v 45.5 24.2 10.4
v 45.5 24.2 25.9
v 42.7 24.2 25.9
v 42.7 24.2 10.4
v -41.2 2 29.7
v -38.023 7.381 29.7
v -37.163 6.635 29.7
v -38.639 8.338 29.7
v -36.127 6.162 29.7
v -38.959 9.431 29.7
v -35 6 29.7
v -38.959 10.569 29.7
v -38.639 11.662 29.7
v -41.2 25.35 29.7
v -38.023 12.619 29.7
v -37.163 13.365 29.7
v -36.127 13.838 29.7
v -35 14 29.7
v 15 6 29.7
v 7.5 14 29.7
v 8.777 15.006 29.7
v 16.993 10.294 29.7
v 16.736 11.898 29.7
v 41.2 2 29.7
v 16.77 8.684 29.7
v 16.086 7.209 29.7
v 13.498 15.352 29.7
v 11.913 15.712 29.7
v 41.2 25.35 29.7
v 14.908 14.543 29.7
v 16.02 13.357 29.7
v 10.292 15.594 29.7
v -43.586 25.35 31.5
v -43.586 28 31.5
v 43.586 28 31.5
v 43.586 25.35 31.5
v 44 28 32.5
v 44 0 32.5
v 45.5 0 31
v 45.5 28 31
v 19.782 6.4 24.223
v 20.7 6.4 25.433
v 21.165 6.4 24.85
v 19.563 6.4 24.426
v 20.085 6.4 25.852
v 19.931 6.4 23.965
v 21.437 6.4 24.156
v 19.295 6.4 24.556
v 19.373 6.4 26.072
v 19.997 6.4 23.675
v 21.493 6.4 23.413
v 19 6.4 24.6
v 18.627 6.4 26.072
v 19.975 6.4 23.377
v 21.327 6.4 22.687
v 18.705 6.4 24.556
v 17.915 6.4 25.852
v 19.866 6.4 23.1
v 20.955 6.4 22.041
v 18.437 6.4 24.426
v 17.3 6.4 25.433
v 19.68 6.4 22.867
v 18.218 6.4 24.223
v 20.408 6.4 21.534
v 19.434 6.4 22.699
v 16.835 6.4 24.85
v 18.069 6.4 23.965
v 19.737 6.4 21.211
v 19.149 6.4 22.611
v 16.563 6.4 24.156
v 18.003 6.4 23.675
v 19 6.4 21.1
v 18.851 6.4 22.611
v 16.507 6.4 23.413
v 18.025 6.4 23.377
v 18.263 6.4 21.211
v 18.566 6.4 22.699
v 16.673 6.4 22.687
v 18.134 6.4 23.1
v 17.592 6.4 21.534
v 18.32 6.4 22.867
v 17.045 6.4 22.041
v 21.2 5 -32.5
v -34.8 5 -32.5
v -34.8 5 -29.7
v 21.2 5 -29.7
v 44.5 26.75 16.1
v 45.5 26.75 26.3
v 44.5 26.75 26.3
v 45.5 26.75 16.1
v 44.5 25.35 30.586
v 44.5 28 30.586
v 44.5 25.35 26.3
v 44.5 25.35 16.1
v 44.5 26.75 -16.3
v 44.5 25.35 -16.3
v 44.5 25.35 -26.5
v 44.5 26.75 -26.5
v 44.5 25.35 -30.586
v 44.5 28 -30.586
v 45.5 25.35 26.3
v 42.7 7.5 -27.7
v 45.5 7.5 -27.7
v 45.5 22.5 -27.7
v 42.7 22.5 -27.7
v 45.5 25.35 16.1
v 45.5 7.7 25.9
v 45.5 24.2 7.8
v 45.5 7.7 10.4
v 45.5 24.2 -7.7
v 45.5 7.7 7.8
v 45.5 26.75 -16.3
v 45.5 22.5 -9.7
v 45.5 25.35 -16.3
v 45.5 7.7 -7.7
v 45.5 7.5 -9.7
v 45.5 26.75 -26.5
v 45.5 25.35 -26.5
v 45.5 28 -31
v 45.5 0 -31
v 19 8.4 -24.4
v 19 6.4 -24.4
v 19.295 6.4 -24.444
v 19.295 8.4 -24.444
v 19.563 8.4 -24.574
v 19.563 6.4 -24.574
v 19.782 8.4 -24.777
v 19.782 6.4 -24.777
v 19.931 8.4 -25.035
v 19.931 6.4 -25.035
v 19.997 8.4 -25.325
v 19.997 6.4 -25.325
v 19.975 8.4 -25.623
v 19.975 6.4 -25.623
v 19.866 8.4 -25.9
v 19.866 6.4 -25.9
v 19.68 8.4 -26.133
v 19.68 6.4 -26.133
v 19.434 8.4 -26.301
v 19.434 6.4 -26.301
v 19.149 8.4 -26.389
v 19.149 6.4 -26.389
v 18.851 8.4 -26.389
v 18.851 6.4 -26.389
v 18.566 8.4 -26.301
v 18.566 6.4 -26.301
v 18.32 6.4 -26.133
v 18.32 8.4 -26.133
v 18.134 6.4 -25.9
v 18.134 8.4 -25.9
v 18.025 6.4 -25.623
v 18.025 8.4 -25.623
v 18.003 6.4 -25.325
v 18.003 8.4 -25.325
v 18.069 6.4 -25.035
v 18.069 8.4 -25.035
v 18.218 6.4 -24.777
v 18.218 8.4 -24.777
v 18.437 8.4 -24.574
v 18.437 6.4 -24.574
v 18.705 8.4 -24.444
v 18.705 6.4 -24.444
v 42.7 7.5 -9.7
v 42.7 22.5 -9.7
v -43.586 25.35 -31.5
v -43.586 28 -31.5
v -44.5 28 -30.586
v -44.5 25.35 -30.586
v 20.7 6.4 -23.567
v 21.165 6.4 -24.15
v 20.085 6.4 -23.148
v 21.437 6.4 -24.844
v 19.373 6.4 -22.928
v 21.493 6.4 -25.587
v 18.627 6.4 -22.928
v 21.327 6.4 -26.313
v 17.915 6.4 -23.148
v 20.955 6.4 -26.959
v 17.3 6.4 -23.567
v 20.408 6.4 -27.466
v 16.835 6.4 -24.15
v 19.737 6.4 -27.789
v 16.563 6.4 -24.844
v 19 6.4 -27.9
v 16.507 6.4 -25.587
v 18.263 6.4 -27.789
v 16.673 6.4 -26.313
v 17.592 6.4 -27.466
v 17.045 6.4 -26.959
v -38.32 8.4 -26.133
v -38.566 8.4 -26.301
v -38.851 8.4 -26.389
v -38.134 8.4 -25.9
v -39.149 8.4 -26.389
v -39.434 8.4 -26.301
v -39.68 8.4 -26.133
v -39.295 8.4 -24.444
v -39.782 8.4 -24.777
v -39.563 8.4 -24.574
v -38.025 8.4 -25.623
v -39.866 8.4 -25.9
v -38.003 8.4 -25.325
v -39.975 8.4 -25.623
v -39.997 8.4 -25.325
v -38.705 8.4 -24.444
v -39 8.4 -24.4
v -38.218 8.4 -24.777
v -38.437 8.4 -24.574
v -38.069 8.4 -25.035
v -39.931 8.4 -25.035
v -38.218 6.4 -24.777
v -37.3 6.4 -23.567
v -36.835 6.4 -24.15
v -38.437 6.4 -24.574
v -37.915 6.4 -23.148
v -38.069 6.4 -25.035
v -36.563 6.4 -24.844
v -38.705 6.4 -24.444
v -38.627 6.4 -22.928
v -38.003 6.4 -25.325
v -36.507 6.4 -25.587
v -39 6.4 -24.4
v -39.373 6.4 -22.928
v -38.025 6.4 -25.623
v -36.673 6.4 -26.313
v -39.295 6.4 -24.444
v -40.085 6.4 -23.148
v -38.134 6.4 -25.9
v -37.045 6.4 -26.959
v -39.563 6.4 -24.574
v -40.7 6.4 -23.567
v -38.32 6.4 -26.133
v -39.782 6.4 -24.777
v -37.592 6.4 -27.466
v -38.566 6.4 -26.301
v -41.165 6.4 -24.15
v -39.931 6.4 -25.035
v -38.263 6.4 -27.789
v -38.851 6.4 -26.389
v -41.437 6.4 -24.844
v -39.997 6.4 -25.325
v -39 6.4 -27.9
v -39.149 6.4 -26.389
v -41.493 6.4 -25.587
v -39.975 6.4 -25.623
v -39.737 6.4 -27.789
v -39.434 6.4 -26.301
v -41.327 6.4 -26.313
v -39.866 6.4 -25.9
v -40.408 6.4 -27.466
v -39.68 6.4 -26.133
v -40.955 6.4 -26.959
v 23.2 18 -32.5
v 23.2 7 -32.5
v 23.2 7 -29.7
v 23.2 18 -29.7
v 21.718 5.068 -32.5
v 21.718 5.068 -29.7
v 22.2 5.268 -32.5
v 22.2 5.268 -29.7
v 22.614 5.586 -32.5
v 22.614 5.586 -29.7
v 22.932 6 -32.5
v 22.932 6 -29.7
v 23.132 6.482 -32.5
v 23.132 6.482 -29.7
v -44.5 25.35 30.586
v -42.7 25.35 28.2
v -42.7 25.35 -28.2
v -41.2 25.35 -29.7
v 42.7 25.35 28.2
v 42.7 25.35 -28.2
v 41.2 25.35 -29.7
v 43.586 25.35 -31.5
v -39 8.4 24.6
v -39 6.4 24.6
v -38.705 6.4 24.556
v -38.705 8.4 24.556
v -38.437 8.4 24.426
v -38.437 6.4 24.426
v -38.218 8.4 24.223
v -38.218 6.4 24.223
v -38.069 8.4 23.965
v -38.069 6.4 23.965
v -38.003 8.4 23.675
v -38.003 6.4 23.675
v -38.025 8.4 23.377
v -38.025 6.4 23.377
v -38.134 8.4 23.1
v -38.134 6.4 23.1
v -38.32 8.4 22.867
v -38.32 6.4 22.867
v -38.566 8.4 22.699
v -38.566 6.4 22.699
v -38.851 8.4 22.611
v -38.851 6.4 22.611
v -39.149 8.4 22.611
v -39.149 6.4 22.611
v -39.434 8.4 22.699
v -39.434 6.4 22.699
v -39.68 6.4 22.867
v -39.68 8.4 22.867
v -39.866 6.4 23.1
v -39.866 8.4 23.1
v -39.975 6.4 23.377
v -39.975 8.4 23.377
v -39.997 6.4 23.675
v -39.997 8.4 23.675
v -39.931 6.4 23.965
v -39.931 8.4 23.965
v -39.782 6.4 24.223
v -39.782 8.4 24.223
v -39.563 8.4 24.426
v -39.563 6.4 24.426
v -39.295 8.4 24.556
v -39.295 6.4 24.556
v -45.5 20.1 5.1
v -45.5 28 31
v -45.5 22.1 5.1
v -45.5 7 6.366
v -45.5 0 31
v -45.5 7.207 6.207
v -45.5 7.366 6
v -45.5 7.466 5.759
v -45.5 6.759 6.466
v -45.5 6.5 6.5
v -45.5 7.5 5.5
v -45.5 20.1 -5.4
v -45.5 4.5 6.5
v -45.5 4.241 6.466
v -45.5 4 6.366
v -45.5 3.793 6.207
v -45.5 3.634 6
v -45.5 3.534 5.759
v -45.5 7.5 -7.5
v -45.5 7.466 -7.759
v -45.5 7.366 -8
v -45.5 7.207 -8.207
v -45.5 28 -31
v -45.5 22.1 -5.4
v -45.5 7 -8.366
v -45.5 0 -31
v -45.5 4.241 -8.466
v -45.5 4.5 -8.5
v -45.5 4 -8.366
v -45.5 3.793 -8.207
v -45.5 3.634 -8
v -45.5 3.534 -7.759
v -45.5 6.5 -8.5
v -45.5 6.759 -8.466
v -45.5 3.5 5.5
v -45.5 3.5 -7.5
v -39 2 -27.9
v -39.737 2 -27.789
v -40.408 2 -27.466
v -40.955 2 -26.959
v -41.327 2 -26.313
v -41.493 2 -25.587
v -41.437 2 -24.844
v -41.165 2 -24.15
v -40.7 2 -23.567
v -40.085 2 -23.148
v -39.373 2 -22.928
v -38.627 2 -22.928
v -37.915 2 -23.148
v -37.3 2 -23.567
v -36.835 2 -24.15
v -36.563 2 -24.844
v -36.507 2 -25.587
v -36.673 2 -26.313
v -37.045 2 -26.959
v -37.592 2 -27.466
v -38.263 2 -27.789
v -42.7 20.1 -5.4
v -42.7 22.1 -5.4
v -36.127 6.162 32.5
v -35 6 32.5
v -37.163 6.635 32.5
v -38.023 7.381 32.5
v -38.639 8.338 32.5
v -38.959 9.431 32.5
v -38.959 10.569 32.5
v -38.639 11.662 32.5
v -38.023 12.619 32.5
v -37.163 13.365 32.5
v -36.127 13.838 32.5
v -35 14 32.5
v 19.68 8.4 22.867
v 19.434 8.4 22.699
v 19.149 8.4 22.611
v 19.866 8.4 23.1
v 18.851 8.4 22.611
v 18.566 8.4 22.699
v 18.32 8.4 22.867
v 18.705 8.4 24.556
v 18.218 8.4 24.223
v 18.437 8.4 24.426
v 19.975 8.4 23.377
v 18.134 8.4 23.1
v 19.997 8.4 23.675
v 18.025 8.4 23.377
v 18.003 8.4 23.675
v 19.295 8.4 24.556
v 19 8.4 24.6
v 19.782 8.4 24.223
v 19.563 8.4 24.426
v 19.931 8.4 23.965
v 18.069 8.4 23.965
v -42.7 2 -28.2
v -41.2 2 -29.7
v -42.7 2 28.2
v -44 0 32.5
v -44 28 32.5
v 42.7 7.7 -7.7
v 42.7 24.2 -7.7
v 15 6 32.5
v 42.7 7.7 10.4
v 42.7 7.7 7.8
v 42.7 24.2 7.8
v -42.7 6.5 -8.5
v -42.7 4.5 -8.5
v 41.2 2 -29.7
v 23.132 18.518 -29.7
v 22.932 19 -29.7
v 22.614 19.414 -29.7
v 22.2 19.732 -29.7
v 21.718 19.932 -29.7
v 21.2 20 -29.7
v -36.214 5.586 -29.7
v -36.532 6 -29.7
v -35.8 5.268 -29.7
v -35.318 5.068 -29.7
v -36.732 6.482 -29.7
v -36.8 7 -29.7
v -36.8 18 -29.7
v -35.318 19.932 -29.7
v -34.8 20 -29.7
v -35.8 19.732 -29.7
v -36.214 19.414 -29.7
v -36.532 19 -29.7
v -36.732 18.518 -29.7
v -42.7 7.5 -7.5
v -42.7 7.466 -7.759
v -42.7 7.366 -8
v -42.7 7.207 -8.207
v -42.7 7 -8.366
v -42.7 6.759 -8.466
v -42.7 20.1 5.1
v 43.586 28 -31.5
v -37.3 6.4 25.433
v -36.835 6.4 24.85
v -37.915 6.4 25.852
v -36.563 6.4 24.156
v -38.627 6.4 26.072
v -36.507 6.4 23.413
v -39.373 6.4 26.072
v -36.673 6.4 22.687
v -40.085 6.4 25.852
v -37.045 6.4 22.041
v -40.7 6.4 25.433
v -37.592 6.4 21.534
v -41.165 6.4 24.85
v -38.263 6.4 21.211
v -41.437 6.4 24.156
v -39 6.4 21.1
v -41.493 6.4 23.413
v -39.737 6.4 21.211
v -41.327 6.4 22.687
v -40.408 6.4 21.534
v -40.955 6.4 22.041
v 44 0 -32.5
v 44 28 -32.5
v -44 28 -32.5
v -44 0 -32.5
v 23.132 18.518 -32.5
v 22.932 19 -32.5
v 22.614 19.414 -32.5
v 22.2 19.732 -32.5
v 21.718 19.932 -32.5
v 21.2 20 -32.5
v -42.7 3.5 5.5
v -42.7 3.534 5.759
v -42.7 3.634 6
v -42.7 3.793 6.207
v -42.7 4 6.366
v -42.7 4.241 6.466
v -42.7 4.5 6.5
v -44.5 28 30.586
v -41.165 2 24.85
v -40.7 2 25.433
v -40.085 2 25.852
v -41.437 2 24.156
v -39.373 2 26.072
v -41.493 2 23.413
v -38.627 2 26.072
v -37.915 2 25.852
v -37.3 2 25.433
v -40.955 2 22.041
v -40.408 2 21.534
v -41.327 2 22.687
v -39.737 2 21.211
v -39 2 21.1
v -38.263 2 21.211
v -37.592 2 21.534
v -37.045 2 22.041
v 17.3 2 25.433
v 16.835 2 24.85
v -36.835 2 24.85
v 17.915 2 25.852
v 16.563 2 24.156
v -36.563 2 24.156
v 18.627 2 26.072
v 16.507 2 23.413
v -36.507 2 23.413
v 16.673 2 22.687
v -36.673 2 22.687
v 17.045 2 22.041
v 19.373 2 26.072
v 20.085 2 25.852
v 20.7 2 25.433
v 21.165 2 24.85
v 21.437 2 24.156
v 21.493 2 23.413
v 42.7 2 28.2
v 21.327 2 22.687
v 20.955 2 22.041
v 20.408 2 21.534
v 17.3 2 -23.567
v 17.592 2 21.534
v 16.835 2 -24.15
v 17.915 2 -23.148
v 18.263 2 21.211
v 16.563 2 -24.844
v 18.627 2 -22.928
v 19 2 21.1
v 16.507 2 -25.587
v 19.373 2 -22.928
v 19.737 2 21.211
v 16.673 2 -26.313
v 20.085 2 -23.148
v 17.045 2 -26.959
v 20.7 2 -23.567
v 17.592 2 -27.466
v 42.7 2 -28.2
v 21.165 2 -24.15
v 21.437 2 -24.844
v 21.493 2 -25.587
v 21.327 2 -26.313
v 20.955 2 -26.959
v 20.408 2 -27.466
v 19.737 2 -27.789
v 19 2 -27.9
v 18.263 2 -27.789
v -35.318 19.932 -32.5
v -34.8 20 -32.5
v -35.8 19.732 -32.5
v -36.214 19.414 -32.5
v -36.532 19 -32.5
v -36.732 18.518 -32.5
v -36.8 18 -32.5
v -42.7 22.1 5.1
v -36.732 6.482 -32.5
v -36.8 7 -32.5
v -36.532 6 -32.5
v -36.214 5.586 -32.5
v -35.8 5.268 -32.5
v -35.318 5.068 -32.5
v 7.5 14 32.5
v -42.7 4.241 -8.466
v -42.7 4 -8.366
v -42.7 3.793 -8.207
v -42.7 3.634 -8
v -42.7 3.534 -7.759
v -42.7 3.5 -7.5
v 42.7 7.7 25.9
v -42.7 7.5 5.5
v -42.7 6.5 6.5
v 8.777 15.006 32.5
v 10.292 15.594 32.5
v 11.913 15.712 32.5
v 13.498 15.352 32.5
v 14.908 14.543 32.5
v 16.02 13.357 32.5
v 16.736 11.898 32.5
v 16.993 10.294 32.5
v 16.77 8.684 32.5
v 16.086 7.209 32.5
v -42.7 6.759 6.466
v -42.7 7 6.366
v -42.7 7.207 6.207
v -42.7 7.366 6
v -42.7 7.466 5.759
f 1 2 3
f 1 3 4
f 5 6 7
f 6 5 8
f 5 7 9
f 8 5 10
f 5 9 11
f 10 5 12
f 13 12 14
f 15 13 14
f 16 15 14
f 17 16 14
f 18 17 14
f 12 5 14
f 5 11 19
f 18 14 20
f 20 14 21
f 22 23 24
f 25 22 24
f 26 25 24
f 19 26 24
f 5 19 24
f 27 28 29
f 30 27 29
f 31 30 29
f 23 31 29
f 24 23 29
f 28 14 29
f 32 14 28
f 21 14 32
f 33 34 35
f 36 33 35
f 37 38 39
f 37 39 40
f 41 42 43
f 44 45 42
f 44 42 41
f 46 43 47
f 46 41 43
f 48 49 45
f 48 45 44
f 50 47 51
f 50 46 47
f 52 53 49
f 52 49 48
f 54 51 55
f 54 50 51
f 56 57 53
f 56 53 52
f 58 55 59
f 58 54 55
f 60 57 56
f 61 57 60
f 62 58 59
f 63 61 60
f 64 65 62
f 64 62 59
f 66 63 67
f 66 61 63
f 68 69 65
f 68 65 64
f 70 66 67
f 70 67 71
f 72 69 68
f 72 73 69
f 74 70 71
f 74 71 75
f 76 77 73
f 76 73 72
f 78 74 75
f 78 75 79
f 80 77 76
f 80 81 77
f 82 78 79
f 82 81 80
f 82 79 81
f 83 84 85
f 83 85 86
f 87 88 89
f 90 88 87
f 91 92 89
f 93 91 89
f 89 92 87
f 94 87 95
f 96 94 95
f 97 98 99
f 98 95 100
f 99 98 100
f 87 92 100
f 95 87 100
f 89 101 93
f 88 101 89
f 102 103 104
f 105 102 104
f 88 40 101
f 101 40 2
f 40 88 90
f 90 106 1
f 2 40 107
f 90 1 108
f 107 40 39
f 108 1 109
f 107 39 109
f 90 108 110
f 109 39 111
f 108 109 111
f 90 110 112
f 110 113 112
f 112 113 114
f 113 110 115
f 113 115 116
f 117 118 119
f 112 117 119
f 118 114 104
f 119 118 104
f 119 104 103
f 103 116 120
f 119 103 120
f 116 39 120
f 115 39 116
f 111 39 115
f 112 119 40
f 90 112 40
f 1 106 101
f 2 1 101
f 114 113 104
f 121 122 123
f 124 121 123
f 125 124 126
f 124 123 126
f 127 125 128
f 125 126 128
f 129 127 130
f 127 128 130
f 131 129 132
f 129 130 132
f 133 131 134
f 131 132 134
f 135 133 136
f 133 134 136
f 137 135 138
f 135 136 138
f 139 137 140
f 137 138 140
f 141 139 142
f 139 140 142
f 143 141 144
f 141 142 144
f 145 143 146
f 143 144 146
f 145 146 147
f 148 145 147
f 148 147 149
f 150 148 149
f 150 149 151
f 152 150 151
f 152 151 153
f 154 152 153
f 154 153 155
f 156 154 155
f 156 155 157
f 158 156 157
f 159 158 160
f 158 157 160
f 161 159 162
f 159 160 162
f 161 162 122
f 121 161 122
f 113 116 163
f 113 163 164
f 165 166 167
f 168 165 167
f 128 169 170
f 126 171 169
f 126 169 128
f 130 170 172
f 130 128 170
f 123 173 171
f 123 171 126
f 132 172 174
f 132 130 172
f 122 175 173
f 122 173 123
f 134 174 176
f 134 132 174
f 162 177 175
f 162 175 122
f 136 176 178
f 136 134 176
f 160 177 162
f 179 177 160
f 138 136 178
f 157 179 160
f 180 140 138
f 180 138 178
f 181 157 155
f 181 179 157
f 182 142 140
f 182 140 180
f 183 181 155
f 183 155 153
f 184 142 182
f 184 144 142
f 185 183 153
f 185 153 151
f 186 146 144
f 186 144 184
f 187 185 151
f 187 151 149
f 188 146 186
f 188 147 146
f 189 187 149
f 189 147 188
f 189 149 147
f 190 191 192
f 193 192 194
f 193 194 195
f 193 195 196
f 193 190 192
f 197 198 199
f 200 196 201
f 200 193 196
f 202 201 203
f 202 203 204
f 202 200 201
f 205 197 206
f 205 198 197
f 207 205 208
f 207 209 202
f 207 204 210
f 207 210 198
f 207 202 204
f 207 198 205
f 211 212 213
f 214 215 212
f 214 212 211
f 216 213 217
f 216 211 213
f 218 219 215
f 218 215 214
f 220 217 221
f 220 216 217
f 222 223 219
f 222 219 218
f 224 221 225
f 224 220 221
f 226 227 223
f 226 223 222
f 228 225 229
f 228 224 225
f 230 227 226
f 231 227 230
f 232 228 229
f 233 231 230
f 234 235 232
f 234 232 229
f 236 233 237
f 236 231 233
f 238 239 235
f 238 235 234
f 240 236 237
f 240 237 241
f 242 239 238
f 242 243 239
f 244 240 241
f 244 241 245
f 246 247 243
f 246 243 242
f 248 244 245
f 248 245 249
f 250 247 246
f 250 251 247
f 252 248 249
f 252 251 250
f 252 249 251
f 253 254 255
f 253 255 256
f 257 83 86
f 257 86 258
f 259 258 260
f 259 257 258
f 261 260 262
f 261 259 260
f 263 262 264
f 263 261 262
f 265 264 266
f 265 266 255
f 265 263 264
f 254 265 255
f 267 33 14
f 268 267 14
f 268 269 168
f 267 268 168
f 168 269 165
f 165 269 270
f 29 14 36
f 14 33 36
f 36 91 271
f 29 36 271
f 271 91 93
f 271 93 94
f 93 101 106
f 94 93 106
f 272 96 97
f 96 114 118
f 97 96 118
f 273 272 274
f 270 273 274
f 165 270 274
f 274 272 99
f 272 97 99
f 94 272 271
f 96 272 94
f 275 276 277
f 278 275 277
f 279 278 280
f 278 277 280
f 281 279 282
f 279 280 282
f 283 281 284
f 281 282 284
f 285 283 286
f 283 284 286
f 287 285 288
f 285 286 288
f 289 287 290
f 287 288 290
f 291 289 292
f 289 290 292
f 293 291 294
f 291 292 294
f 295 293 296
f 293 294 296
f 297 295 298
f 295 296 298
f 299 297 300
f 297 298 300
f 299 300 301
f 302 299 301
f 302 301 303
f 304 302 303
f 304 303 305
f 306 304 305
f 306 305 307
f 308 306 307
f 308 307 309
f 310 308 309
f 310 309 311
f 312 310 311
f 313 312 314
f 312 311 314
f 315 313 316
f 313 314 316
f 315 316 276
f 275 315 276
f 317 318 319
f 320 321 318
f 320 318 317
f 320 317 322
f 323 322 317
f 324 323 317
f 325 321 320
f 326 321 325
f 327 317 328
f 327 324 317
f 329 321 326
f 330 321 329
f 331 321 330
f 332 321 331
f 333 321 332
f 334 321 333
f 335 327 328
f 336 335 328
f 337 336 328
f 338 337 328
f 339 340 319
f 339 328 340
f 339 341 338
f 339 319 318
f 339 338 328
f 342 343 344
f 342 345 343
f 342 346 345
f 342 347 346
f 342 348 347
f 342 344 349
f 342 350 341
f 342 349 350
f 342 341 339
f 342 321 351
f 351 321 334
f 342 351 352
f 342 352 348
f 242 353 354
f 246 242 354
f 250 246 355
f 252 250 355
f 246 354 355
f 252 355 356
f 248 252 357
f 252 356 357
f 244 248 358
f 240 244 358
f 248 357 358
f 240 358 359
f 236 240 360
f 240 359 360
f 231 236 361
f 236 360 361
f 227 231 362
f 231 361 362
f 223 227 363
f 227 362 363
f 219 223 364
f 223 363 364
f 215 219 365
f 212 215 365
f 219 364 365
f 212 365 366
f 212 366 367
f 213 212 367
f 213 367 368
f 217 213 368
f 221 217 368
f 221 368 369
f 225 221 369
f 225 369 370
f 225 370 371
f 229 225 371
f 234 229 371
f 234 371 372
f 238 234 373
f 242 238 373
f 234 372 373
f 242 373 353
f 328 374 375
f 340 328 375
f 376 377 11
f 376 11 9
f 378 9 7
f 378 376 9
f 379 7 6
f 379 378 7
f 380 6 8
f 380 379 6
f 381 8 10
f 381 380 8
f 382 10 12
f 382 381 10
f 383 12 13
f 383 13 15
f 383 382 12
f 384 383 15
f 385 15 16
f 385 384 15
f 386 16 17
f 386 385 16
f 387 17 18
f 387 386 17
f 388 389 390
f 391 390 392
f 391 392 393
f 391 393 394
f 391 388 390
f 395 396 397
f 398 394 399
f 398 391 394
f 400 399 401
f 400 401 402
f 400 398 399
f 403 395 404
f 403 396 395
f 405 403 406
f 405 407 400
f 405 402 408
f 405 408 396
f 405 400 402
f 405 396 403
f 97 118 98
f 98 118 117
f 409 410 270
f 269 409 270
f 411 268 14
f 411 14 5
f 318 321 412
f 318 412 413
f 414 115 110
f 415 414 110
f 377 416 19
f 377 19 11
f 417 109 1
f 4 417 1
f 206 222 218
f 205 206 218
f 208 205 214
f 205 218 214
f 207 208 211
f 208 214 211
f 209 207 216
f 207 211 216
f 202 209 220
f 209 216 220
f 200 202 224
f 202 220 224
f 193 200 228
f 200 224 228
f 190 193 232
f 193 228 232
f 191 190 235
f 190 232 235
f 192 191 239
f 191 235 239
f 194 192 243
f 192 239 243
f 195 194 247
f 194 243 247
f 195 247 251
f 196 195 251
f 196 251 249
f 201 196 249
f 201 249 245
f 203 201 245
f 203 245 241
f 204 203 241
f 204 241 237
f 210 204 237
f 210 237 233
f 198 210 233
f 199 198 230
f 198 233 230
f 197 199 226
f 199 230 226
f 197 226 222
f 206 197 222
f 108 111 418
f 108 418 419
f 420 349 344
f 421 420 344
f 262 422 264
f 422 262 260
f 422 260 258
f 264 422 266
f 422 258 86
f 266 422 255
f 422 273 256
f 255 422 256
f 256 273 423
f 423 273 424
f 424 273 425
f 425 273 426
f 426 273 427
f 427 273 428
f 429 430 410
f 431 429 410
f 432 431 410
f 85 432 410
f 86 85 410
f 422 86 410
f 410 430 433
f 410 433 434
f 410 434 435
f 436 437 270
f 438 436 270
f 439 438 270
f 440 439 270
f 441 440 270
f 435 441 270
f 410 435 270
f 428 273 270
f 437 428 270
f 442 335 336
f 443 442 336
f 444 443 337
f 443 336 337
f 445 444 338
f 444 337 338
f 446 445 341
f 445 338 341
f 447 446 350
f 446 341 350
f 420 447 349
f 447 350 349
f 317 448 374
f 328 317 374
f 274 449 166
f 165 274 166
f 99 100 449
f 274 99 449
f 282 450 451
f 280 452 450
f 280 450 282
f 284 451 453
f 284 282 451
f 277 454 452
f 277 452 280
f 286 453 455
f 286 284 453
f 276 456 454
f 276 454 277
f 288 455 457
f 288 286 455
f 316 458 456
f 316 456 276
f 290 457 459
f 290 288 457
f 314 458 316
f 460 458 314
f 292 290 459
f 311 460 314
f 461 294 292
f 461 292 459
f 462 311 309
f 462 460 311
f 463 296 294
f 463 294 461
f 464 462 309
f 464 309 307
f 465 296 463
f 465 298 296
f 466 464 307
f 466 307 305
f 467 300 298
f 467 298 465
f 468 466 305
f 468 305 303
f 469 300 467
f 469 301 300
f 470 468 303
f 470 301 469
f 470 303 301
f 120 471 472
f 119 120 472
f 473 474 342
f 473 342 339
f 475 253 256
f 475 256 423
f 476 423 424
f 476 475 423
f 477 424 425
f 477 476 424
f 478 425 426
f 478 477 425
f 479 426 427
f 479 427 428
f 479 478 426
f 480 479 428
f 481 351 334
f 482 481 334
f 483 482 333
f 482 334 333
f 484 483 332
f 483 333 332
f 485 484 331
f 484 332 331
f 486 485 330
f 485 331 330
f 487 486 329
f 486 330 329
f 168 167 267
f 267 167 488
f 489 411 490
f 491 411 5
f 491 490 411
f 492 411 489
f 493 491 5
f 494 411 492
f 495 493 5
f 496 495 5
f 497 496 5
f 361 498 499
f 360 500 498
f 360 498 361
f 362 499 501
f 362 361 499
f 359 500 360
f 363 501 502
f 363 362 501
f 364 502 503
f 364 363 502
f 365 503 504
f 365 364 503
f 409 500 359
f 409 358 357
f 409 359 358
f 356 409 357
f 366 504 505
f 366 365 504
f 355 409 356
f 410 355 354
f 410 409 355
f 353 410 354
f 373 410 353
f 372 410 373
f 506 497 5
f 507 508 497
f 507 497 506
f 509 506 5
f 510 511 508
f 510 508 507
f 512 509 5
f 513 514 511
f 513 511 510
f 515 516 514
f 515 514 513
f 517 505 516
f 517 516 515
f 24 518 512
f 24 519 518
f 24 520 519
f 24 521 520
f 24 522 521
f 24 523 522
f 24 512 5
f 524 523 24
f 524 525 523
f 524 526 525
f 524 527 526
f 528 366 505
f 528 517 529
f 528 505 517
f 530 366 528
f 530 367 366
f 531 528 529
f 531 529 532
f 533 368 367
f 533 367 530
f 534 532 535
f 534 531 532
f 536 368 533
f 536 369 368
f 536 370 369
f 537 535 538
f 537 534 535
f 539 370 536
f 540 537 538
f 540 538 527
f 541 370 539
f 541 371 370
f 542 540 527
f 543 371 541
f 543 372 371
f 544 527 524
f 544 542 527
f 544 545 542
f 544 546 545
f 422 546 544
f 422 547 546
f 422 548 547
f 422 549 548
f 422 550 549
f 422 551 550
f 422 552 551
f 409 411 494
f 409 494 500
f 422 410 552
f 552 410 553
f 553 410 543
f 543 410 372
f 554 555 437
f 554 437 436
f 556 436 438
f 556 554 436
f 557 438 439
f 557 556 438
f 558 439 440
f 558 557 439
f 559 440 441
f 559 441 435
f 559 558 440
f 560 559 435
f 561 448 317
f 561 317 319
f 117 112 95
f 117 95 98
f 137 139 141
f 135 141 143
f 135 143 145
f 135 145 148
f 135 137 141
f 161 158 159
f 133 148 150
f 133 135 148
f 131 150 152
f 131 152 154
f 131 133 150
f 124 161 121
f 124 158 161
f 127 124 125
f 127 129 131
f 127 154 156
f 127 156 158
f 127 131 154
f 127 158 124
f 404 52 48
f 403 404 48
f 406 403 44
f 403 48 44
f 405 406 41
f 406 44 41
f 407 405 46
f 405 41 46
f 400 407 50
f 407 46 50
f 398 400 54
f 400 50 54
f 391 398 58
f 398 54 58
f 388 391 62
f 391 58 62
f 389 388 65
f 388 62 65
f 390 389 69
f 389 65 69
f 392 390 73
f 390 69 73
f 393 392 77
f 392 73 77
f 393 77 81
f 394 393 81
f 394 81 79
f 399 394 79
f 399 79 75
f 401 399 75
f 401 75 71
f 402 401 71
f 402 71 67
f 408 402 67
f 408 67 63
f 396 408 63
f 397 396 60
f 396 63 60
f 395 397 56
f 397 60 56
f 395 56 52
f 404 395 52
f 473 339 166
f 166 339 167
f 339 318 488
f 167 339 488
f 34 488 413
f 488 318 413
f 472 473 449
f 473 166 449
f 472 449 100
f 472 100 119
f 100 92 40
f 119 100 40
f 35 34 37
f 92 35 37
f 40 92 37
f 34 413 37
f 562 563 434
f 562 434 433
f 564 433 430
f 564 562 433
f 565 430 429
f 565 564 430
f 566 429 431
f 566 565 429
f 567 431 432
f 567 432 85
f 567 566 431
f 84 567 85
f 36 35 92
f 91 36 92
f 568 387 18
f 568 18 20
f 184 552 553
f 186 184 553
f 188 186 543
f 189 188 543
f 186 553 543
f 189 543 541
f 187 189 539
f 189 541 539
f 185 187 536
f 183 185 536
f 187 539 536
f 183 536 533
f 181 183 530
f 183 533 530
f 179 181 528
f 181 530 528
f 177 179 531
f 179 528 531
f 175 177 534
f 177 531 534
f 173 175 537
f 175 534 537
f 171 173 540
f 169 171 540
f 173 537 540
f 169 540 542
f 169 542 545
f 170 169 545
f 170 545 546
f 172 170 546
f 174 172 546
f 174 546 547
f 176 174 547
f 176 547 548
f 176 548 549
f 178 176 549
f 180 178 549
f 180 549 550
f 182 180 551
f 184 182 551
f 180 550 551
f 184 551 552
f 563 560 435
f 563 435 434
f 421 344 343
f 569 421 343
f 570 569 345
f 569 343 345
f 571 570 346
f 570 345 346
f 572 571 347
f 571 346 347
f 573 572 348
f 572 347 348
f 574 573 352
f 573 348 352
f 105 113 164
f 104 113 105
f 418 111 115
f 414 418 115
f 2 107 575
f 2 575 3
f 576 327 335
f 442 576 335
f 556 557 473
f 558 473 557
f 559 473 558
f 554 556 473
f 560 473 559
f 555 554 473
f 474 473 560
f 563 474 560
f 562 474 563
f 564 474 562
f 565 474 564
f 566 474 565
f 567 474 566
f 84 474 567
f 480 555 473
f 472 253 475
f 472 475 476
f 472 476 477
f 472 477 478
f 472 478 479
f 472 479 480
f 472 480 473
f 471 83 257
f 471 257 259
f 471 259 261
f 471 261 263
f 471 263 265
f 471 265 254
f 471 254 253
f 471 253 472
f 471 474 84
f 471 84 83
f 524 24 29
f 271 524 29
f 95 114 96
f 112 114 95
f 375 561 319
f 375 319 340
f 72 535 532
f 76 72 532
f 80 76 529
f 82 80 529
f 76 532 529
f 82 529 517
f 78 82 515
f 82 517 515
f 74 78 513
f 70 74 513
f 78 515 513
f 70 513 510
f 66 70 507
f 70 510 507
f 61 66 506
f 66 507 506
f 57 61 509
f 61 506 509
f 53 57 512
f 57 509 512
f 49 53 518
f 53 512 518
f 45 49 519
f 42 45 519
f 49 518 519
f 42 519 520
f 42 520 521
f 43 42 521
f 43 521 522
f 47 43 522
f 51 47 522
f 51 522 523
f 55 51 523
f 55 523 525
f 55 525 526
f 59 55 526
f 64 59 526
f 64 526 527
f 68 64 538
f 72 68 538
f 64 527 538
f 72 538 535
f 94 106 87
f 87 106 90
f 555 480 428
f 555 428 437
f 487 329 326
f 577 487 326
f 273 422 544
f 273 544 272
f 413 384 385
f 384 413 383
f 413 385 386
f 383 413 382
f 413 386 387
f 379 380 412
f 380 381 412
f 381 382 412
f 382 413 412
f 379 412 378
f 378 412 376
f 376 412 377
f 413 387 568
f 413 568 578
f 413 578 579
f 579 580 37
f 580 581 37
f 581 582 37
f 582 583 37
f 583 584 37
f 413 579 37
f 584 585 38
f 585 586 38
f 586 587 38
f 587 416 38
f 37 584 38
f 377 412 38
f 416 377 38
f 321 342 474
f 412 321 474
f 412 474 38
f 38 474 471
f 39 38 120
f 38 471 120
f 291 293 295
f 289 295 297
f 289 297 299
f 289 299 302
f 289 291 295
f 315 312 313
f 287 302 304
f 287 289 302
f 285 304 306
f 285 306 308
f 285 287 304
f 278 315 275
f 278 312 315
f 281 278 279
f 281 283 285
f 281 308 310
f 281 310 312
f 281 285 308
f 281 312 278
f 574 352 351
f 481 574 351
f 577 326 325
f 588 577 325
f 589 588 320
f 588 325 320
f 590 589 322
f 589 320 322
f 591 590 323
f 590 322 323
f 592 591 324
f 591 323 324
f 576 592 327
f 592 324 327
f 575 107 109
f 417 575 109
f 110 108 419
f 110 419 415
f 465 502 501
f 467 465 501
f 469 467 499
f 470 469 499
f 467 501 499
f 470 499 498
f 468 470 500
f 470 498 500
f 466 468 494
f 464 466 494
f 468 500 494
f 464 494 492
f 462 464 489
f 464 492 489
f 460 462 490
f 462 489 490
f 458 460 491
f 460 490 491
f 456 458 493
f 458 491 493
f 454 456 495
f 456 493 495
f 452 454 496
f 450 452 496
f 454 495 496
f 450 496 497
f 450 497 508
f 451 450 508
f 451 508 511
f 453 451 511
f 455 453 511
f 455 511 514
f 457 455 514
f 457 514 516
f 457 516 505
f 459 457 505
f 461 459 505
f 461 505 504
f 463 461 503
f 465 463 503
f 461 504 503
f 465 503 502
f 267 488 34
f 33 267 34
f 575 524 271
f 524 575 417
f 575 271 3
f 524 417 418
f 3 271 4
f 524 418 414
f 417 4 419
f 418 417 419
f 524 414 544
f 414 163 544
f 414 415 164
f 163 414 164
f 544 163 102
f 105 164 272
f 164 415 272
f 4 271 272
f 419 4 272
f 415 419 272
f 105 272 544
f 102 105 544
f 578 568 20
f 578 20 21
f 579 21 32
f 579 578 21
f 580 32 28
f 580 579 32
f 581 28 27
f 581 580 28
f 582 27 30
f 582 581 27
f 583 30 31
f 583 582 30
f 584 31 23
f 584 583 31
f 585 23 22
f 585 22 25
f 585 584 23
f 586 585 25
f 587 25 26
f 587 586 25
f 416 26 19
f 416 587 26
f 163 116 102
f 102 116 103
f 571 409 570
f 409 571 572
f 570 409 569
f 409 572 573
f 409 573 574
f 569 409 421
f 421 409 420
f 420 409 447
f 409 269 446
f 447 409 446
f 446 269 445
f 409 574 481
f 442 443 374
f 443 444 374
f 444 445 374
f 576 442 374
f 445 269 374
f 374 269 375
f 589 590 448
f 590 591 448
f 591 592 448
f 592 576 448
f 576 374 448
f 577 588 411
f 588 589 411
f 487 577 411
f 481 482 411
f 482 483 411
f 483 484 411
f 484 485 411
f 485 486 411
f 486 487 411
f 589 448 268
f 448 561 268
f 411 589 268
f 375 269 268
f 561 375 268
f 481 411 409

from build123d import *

# Parameters (mm, degrees)
SKETCH1_W           = 91
SKETCH1_H           = 65
BOSS_EXTRUDE1_DEPTH = 2
SKETCH2_R           = 2.5
BOSS_EXTRUDE2_DEPTH = 4.4
SKETCH3_R           = 1
BOSS_EXTRUDE3_DEPTH = 2
SKETCH4_W           = 91
SKETCH4_H           = 28
BOSS_EXTRUDE4_DEPTH = 2.8
SKETCH5_W           = 65
SKETCH5_H           = 28
SKETCH5_W_2         = 15.5
SKETCH5_H_2         = 16.5
SKETCH5_W_3         = 18
SKETCH5_H_3         = 15
BOSS_EXTRUDE5_DEPTH = 2.8
SKETCH6_W           = 91
SKETCH6_H           = 28
BOSS_EXTRUDE6_DEPTH = 2.8
SKETCH7_W           = 65
SKETCH7_H           = 28
BOSS_EXTRUDE7_DEPTH = 2.8
CHAMFER1_SIZE       = 1.5
CUT_EXTRUDE1_DEPTH  = 2.65
SKETCH11_W          = 10.5
SKETCH11_H          = 2
CUT_EXTRUDE2_DEPTH  = 3
SKETCH12_W          = 10.2
SKETCH12_H          = 1.4
CUT_EXTRUDE3_DEPTH  = 3


with BuildPart() as part:
    # Sketch1 → Boss-Extrude1 (new body)
    with BuildSketch(Plane(origin=(0, 0, 0), x_dir=(1, 0, 0), z_dir=(0, 1, 0))):
        Rectangle(SKETCH1_W, SKETCH1_H)
    extrude(amount=BOSS_EXTRUDE1_DEPTH)

    # Sketch2 → Boss-Extrude2 (add)
    with BuildSketch(Plane(origin=(0, 2, 0), x_dir=(1, 0, 0), z_dir=(0, 1, 0))):
        with Locations(Location((-39, -23.6, 0), (0, 0, 90))):
            Circle(SKETCH2_R)
        with Locations(Location((-39, 25.4, 0), (0, 0, 90))):
            Circle(SKETCH2_R)
        with Locations(Location((19, 25.4, 0), (0, 0, 90))):
            Circle(SKETCH2_R)
        with Locations(Location((19, -23.6, 0), (0, 0, 90))):
            Circle(SKETCH2_R)
    extrude(amount=BOSS_EXTRUDE2_DEPTH)

    # Sketch3 → Boss-Extrude3 (add)
    with BuildSketch(Plane(origin=(0, 6.4, 0), x_dir=(1, 0, 0), z_dir=(0, 1, 0))):
        with Locations(Location((-39, -23.6, 0), (0, 0, 270))):
            Circle(SKETCH3_R)
        with Locations(Location((-39, 25.4, 0), (0, 0, 270))):
            Circle(SKETCH3_R)
        with Locations(Location((19, 25.4, 0), (0, 0, 270))):
            Circle(SKETCH3_R)
        with Locations(Location((19, -23.6, 0), (0, 0, 270))):
            Circle(SKETCH3_R)
    extrude(amount=BOSS_EXTRUDE3_DEPTH)

    # Sketch4 → Boss-Extrude4 (add)
    with BuildSketch(Plane.XY.offset(32.5)):
        with Locations((0, 14)):
            Rectangle(SKETCH4_W, SKETCH4_H)
        with BuildLine():
            Line((-35, 14), (7.5, 14))
            ThreePointArc((7.5, 14), (15.507804885, 13.99169208), (15, 6))
            Line((15, 6), (-35, 6))
            ThreePointArc((-35, 6), (-39, 10), (-35, 14))
        make_face(mode=Mode.SUBTRACT)
    extrude(amount=-BOSS_EXTRUDE4_DEPTH)

    # Sketch5 → Boss-Extrude5 (add)
    with BuildSketch(Plane(origin=(45.5, 0, 0), x_dir=(0, 0, -1), z_dir=(1, 0, 0))):
        with Locations((0, 14)):
            Rectangle(SKETCH5_W, SKETCH5_H)
        with Locations((-18.15, 15.95)):
            Rectangle(SKETCH5_W_2, SKETCH5_H_2, mode=Mode.SUBTRACT)
        with Locations((-0.05, 15.95)):
            Rectangle(SKETCH5_W_2, SKETCH5_H_2, mode=Mode.SUBTRACT)
        with Locations((18.7, 15)):
            Rectangle(SKETCH5_W_3, SKETCH5_H_3, mode=Mode.SUBTRACT)
    extrude(amount=-BOSS_EXTRUDE5_DEPTH)

    # Sketch6 → Boss-Extrude6 (add)
    with BuildSketch(Plane(origin=(0, 0, -32.5), x_dir=(-1, 0, 0), z_dir=(0, 0, -1))):
        with Locations((0, 14)):
            Rectangle(SKETCH6_W, SKETCH6_H)
        with BuildLine():
            Line((-21.2, 20), (34.8, 20))
            ThreePointArc((34.8, 20), (36.214213562, 19.414213562), (36.8, 18))
            Line((36.8, 18), (36.8, 7))
            ThreePointArc((36.8, 7), (36.214213562, 5.585786438), (34.8, 5))
            Line((34.8, 5), (-21.2, 5))
            ThreePointArc((-21.2, 5), (-22.614213562, 5.585786438), (-23.2, 7))
            Line((-23.2, 7), (-23.2, 18))
            ThreePointArc((-23.2, 18), (-22.614213562, 19.414213562), (-21.2, 20))
        make_face(mode=Mode.SUBTRACT)
    extrude(amount=-BOSS_EXTRUDE6_DEPTH)

    # Sketch7 → Boss-Extrude7 (add)
    with BuildSketch(Plane.ZY.offset(45.5)):
        with Locations((0, 14)):
            Rectangle(SKETCH7_W, SKETCH7_H)
        with BuildLine():
            Line((-7.5, 3.5), (5.5, 3.5))
            ThreePointArc((5.5, 3.5), (6.207106781, 3.792893219), (6.5, 4.5))
            Line((6.5, 4.5), (6.5, 6.5))
            ThreePointArc((6.5, 6.5), (6.207106781, 7.207106781), (5.5, 7.5))
            Line((5.5, 7.5), (-7.5, 7.5))
            ThreePointArc((-7.5, 7.5), (-8.207106781, 7.207106781), (-8.5, 6.5))
            Line((-8.5, 6.5), (-8.5, 4.5))
            ThreePointArc((-8.5, 4.5), (-8.207106781, 3.792893219), (-7.5, 3.5))
        make_face(mode=Mode.SUBTRACT)
    extrude(amount=-BOSS_EXTRUDE7_DEPTH)

    # Chamfer1
    chamfer1_edges = [part.edges().sort_by_distance(p)[0] for p in [
        (42.7, 15, -29.7),
        (-42.7, 15, -29.7),
        (-42.7, 15, 29.7),
        (45.5, 14, 32.5),
        (-45.5, 14, 32.5),
        (-45.5, 14, -32.5),
        (45.5, 14, -32.5),
        (42.7, 15, 29.7),
    ]]
    chamfer(chamfer1_edges, length=CHAMFER1_SIZE)

    # Sketch8 → Cut-Extrude1 (cut)
    with BuildSketch(Plane(origin=(0, 28, 0), x_dir=(1, 0, 0), z_dir=(0, 1, 0))):
        Polygon((43.585786438, 31.5), (-43.585786438, 31.5), (-44.5, 30.585786438), (-44.5, -30.585786438), (-43.585786438, -31.5), (43.585786438, -31.5), (44.5, -30.585786438), (44.5, 30.585786438), align=None)
    extrude(amount=-CUT_EXTRUDE1_DEPTH, mode=Mode.SUBTRACT)

    # Sketch11 → Cut-Extrude2 (cut)
    with BuildSketch(Plane(origin=(-42.7, 0, 0), x_dir=(0, 0, -1), z_dir=(1, 0, 0))):
        with Locations((0.15, 21.1)):
            Rectangle(SKETCH11_W, SKETCH11_H)
    extrude(amount=-CUT_EXTRUDE2_DEPTH, mode=Mode.SUBTRACT)

    # Sketch12 → Cut-Extrude3 (cut)
    with BuildSketch(Plane(origin=(45.5, 0, 0), x_dir=(0, 0, -1), z_dir=(1, 0, 0))):
        with Locations((-21.2, 26.05)):
            Rectangle(SKETCH12_W, SKETCH12_H)
        with Locations((21.4, 26.05)):
            Rectangle(SKETCH12_W, SKETCH12_H)
    extrude(amount=-CUT_EXTRUDE3_DEPTH, mode=Mode.SUBTRACT)


solid = part.part
